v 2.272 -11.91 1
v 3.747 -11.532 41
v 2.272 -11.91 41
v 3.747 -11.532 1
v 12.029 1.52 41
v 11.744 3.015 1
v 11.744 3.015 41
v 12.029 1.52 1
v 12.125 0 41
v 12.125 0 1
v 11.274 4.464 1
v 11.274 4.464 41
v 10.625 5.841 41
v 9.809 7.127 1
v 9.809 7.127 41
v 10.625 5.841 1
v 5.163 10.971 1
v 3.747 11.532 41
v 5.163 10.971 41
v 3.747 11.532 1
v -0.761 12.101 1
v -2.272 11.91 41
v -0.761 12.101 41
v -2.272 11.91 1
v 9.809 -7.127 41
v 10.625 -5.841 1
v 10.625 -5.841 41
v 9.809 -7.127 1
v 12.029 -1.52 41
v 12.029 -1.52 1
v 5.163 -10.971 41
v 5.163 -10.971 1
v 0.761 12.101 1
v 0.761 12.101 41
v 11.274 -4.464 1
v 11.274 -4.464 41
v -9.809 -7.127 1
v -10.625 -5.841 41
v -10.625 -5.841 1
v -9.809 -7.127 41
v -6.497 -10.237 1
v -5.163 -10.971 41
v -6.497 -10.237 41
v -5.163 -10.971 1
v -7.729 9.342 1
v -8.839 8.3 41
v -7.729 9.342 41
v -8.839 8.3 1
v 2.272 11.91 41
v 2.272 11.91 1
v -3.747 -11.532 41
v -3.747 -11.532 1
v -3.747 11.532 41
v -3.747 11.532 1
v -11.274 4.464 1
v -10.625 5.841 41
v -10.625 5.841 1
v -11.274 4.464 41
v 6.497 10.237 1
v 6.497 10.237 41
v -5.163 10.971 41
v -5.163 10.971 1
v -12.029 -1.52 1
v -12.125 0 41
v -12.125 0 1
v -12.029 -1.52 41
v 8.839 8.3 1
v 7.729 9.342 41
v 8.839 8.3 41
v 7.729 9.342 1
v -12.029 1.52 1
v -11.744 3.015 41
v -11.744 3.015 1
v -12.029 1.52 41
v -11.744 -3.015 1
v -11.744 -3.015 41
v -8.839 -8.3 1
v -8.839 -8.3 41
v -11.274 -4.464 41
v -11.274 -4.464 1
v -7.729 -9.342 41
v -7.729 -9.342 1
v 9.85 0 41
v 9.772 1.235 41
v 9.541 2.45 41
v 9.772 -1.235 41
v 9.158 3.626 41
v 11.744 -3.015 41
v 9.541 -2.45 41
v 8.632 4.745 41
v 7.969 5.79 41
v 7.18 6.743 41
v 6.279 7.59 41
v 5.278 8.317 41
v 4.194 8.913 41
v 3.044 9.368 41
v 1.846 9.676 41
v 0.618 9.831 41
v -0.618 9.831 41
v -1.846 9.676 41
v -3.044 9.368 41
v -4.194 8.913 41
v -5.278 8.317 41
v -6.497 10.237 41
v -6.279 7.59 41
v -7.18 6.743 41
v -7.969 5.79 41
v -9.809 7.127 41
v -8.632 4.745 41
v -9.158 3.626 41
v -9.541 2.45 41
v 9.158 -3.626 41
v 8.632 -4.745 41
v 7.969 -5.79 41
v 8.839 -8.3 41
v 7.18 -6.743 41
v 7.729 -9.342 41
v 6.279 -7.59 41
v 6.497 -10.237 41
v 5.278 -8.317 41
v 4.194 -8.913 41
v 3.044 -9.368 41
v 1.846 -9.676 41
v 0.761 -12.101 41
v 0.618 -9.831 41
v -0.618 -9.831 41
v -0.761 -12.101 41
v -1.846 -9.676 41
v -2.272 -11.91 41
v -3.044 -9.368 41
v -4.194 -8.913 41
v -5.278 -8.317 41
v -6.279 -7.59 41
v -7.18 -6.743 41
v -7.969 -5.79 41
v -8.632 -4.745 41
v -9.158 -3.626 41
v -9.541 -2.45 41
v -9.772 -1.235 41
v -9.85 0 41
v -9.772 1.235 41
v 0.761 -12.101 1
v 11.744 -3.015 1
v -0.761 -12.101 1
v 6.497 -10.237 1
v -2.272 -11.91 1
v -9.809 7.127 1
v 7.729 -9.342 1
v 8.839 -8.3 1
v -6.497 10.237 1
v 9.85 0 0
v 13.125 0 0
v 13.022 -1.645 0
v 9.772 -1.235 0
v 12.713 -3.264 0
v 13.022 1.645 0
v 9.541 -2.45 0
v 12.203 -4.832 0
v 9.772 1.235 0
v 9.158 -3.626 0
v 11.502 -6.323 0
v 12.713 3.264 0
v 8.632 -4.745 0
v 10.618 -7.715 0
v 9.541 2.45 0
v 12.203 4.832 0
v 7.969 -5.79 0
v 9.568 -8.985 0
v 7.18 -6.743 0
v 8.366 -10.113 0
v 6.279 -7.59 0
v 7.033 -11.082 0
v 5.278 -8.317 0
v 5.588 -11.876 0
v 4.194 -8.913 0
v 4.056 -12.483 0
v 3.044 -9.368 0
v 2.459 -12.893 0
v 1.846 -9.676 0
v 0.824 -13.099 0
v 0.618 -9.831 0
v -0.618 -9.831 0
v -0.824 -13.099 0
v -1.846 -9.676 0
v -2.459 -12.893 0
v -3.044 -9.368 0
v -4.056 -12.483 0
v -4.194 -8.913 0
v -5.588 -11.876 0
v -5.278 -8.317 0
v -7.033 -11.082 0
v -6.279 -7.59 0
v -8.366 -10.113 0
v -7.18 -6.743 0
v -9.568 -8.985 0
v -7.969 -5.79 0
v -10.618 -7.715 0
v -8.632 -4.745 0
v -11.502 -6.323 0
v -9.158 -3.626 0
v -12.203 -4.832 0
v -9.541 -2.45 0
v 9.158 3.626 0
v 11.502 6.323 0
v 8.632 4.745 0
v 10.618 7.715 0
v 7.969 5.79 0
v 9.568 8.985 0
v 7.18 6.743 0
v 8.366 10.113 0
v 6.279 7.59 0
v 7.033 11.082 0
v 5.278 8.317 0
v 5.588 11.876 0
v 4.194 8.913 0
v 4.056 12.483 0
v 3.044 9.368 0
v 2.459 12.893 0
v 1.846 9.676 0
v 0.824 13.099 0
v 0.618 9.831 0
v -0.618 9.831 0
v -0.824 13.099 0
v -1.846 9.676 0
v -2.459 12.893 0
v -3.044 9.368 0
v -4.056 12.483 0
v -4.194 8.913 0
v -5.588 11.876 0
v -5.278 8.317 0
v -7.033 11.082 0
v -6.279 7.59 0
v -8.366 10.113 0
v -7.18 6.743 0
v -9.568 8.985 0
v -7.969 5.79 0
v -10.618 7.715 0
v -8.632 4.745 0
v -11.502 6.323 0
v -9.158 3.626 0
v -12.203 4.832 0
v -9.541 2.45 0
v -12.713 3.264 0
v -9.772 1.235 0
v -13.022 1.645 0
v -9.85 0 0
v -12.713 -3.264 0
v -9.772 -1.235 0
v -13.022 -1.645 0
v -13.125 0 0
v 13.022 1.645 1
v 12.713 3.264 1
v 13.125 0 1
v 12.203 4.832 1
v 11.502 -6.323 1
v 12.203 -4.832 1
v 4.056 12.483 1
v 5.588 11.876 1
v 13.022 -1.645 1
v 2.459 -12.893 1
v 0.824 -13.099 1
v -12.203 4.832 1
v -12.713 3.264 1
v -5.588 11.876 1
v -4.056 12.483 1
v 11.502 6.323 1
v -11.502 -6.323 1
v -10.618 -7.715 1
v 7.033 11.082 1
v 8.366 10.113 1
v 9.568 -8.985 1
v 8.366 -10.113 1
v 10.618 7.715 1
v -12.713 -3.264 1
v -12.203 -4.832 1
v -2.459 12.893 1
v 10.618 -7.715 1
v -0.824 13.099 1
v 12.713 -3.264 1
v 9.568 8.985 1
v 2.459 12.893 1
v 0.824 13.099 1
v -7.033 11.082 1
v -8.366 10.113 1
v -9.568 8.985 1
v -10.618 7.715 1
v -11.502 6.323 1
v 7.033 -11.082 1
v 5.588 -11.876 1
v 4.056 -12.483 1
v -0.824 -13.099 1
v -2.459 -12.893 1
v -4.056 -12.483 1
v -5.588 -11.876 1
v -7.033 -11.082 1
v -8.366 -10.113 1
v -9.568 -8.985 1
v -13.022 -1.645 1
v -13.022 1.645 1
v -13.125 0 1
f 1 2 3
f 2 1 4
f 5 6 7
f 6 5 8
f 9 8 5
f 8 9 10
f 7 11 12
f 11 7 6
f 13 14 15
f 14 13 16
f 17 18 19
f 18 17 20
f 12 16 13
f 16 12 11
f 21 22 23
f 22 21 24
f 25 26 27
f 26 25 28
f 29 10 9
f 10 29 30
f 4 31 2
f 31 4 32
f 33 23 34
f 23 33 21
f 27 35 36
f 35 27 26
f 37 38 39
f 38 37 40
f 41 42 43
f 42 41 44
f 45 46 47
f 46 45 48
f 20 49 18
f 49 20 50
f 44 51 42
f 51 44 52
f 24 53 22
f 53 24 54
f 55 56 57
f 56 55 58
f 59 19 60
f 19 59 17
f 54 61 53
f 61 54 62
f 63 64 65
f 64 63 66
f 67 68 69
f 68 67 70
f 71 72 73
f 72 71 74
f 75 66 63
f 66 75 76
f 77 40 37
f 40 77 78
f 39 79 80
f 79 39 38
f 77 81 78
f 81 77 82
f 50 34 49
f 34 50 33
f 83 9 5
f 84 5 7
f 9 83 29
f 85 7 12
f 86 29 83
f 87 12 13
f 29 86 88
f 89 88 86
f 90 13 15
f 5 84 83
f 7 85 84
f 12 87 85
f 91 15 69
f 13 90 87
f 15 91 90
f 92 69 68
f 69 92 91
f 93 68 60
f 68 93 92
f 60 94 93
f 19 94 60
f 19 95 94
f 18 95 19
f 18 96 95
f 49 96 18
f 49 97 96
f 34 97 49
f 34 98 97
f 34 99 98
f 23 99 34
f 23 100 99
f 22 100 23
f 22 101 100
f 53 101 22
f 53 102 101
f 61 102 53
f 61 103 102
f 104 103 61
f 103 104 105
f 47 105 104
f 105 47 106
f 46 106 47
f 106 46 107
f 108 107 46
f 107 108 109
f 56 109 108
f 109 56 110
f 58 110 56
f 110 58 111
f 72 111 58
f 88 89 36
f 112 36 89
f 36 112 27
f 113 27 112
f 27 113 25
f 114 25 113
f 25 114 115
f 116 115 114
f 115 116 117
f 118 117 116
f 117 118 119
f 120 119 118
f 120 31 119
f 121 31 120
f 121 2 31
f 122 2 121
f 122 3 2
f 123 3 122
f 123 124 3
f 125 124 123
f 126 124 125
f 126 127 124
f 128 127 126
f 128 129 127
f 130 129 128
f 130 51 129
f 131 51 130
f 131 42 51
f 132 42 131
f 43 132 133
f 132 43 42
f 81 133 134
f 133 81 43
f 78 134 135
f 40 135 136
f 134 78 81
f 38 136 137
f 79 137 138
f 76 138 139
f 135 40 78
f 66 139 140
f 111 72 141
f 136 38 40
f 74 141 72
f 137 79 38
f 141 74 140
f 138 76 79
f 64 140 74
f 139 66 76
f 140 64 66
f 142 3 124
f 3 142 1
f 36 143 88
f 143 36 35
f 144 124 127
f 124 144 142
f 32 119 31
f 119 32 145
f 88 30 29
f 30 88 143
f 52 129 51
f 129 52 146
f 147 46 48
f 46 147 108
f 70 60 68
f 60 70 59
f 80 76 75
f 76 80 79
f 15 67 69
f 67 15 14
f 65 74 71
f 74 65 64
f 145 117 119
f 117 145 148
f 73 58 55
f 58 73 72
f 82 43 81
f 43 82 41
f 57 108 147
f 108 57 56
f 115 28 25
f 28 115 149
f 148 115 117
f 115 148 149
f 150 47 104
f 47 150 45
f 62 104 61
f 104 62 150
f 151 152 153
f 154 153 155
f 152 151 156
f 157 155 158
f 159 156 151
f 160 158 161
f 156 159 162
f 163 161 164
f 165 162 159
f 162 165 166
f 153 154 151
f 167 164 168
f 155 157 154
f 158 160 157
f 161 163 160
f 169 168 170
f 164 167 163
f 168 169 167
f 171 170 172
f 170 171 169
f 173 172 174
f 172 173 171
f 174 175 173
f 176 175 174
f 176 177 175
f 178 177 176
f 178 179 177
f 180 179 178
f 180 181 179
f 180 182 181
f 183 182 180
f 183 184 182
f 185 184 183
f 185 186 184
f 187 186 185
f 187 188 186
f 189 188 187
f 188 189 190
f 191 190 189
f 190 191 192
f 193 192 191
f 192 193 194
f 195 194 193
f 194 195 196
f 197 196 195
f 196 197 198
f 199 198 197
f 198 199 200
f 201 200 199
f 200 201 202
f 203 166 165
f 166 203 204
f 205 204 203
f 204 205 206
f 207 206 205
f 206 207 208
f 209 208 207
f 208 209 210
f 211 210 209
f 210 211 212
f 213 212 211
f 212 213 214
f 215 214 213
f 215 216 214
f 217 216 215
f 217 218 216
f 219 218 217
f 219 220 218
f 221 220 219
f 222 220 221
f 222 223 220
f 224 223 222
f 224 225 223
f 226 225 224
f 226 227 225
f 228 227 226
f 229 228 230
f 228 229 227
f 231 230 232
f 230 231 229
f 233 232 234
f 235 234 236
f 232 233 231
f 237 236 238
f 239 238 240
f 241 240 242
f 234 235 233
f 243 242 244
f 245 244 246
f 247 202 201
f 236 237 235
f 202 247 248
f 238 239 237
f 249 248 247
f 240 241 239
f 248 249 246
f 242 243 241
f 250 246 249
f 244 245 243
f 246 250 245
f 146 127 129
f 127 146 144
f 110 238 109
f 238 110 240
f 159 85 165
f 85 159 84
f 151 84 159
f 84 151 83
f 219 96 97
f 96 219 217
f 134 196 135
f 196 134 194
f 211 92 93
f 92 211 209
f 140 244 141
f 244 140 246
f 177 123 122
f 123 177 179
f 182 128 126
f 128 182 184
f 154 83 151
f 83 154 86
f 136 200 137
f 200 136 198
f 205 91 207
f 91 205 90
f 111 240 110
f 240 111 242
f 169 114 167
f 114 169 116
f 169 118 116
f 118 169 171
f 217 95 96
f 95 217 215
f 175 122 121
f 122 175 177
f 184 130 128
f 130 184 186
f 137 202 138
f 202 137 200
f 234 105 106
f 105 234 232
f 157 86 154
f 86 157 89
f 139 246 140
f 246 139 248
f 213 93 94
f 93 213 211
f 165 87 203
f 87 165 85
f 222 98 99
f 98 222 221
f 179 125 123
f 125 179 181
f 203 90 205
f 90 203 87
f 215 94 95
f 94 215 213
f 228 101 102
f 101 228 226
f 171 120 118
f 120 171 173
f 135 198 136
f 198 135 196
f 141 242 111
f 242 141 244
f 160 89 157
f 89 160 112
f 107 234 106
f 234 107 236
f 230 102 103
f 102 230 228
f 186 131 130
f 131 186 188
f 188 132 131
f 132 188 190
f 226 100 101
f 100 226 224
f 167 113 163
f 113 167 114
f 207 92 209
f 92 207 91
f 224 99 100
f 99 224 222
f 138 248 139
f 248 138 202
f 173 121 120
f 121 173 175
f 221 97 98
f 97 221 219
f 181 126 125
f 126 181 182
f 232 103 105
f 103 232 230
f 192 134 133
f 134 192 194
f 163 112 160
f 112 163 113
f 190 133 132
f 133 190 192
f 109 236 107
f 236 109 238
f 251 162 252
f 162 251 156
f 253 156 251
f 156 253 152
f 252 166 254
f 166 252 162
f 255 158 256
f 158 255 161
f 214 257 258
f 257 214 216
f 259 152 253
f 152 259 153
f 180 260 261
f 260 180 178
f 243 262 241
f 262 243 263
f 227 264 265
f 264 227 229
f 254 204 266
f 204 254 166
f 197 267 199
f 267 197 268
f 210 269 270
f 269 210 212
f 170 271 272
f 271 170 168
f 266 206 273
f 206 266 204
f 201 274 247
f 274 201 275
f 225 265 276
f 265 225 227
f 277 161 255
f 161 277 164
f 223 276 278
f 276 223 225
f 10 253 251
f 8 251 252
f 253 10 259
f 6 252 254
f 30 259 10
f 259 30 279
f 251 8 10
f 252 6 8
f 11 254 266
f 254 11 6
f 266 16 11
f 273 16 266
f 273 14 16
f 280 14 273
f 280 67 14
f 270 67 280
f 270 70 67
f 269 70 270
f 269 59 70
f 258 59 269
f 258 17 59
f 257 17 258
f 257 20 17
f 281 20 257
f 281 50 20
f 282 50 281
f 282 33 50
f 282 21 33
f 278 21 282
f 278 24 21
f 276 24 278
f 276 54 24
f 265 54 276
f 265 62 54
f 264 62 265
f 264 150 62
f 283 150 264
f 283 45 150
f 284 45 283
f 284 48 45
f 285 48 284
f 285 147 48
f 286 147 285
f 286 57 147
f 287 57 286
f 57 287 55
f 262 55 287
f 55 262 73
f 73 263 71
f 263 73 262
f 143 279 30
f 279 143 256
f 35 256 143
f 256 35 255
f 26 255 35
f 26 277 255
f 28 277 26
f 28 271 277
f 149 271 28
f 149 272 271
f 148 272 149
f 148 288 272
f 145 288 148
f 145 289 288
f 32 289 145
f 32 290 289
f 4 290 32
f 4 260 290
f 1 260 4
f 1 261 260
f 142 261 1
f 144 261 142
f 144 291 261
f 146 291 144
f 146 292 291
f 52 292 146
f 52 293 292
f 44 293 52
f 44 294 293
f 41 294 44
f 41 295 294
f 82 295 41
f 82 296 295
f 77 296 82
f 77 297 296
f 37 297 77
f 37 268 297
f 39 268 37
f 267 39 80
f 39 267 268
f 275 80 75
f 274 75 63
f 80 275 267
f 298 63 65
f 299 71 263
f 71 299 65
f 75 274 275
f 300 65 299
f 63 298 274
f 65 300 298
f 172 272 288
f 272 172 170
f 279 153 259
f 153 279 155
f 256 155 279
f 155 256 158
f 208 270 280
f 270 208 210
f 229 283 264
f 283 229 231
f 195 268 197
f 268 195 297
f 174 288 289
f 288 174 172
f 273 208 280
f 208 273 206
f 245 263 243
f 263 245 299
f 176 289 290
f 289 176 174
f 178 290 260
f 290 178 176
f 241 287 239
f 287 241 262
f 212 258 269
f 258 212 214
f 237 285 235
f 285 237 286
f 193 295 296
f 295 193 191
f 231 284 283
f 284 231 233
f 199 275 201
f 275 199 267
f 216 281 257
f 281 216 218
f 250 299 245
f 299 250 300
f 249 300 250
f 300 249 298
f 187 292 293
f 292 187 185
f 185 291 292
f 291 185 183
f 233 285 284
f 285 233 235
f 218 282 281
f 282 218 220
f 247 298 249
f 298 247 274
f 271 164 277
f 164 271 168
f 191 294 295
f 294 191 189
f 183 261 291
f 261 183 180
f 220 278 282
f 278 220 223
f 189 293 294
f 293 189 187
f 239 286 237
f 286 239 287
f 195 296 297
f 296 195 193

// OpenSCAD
// file: lib.scad
inch = 25.4;
OD = 24.5; // od of lager tube
snug_id_small = 19.7;
insert_diameter = 24.25;

module tube(od, id, h){
  difference(){
    color([1, .3, .6])cylinder(d=od, h=h);
    translate([0, 0, -1])cylinder(d=id, h=h + 2);
  }
}
// main file
$fn=50;
include <lib.scad>
tube(insert_diameter, snug_id_small, 41);
tube(insert_diameter + 2, snug_id_small, 1);
